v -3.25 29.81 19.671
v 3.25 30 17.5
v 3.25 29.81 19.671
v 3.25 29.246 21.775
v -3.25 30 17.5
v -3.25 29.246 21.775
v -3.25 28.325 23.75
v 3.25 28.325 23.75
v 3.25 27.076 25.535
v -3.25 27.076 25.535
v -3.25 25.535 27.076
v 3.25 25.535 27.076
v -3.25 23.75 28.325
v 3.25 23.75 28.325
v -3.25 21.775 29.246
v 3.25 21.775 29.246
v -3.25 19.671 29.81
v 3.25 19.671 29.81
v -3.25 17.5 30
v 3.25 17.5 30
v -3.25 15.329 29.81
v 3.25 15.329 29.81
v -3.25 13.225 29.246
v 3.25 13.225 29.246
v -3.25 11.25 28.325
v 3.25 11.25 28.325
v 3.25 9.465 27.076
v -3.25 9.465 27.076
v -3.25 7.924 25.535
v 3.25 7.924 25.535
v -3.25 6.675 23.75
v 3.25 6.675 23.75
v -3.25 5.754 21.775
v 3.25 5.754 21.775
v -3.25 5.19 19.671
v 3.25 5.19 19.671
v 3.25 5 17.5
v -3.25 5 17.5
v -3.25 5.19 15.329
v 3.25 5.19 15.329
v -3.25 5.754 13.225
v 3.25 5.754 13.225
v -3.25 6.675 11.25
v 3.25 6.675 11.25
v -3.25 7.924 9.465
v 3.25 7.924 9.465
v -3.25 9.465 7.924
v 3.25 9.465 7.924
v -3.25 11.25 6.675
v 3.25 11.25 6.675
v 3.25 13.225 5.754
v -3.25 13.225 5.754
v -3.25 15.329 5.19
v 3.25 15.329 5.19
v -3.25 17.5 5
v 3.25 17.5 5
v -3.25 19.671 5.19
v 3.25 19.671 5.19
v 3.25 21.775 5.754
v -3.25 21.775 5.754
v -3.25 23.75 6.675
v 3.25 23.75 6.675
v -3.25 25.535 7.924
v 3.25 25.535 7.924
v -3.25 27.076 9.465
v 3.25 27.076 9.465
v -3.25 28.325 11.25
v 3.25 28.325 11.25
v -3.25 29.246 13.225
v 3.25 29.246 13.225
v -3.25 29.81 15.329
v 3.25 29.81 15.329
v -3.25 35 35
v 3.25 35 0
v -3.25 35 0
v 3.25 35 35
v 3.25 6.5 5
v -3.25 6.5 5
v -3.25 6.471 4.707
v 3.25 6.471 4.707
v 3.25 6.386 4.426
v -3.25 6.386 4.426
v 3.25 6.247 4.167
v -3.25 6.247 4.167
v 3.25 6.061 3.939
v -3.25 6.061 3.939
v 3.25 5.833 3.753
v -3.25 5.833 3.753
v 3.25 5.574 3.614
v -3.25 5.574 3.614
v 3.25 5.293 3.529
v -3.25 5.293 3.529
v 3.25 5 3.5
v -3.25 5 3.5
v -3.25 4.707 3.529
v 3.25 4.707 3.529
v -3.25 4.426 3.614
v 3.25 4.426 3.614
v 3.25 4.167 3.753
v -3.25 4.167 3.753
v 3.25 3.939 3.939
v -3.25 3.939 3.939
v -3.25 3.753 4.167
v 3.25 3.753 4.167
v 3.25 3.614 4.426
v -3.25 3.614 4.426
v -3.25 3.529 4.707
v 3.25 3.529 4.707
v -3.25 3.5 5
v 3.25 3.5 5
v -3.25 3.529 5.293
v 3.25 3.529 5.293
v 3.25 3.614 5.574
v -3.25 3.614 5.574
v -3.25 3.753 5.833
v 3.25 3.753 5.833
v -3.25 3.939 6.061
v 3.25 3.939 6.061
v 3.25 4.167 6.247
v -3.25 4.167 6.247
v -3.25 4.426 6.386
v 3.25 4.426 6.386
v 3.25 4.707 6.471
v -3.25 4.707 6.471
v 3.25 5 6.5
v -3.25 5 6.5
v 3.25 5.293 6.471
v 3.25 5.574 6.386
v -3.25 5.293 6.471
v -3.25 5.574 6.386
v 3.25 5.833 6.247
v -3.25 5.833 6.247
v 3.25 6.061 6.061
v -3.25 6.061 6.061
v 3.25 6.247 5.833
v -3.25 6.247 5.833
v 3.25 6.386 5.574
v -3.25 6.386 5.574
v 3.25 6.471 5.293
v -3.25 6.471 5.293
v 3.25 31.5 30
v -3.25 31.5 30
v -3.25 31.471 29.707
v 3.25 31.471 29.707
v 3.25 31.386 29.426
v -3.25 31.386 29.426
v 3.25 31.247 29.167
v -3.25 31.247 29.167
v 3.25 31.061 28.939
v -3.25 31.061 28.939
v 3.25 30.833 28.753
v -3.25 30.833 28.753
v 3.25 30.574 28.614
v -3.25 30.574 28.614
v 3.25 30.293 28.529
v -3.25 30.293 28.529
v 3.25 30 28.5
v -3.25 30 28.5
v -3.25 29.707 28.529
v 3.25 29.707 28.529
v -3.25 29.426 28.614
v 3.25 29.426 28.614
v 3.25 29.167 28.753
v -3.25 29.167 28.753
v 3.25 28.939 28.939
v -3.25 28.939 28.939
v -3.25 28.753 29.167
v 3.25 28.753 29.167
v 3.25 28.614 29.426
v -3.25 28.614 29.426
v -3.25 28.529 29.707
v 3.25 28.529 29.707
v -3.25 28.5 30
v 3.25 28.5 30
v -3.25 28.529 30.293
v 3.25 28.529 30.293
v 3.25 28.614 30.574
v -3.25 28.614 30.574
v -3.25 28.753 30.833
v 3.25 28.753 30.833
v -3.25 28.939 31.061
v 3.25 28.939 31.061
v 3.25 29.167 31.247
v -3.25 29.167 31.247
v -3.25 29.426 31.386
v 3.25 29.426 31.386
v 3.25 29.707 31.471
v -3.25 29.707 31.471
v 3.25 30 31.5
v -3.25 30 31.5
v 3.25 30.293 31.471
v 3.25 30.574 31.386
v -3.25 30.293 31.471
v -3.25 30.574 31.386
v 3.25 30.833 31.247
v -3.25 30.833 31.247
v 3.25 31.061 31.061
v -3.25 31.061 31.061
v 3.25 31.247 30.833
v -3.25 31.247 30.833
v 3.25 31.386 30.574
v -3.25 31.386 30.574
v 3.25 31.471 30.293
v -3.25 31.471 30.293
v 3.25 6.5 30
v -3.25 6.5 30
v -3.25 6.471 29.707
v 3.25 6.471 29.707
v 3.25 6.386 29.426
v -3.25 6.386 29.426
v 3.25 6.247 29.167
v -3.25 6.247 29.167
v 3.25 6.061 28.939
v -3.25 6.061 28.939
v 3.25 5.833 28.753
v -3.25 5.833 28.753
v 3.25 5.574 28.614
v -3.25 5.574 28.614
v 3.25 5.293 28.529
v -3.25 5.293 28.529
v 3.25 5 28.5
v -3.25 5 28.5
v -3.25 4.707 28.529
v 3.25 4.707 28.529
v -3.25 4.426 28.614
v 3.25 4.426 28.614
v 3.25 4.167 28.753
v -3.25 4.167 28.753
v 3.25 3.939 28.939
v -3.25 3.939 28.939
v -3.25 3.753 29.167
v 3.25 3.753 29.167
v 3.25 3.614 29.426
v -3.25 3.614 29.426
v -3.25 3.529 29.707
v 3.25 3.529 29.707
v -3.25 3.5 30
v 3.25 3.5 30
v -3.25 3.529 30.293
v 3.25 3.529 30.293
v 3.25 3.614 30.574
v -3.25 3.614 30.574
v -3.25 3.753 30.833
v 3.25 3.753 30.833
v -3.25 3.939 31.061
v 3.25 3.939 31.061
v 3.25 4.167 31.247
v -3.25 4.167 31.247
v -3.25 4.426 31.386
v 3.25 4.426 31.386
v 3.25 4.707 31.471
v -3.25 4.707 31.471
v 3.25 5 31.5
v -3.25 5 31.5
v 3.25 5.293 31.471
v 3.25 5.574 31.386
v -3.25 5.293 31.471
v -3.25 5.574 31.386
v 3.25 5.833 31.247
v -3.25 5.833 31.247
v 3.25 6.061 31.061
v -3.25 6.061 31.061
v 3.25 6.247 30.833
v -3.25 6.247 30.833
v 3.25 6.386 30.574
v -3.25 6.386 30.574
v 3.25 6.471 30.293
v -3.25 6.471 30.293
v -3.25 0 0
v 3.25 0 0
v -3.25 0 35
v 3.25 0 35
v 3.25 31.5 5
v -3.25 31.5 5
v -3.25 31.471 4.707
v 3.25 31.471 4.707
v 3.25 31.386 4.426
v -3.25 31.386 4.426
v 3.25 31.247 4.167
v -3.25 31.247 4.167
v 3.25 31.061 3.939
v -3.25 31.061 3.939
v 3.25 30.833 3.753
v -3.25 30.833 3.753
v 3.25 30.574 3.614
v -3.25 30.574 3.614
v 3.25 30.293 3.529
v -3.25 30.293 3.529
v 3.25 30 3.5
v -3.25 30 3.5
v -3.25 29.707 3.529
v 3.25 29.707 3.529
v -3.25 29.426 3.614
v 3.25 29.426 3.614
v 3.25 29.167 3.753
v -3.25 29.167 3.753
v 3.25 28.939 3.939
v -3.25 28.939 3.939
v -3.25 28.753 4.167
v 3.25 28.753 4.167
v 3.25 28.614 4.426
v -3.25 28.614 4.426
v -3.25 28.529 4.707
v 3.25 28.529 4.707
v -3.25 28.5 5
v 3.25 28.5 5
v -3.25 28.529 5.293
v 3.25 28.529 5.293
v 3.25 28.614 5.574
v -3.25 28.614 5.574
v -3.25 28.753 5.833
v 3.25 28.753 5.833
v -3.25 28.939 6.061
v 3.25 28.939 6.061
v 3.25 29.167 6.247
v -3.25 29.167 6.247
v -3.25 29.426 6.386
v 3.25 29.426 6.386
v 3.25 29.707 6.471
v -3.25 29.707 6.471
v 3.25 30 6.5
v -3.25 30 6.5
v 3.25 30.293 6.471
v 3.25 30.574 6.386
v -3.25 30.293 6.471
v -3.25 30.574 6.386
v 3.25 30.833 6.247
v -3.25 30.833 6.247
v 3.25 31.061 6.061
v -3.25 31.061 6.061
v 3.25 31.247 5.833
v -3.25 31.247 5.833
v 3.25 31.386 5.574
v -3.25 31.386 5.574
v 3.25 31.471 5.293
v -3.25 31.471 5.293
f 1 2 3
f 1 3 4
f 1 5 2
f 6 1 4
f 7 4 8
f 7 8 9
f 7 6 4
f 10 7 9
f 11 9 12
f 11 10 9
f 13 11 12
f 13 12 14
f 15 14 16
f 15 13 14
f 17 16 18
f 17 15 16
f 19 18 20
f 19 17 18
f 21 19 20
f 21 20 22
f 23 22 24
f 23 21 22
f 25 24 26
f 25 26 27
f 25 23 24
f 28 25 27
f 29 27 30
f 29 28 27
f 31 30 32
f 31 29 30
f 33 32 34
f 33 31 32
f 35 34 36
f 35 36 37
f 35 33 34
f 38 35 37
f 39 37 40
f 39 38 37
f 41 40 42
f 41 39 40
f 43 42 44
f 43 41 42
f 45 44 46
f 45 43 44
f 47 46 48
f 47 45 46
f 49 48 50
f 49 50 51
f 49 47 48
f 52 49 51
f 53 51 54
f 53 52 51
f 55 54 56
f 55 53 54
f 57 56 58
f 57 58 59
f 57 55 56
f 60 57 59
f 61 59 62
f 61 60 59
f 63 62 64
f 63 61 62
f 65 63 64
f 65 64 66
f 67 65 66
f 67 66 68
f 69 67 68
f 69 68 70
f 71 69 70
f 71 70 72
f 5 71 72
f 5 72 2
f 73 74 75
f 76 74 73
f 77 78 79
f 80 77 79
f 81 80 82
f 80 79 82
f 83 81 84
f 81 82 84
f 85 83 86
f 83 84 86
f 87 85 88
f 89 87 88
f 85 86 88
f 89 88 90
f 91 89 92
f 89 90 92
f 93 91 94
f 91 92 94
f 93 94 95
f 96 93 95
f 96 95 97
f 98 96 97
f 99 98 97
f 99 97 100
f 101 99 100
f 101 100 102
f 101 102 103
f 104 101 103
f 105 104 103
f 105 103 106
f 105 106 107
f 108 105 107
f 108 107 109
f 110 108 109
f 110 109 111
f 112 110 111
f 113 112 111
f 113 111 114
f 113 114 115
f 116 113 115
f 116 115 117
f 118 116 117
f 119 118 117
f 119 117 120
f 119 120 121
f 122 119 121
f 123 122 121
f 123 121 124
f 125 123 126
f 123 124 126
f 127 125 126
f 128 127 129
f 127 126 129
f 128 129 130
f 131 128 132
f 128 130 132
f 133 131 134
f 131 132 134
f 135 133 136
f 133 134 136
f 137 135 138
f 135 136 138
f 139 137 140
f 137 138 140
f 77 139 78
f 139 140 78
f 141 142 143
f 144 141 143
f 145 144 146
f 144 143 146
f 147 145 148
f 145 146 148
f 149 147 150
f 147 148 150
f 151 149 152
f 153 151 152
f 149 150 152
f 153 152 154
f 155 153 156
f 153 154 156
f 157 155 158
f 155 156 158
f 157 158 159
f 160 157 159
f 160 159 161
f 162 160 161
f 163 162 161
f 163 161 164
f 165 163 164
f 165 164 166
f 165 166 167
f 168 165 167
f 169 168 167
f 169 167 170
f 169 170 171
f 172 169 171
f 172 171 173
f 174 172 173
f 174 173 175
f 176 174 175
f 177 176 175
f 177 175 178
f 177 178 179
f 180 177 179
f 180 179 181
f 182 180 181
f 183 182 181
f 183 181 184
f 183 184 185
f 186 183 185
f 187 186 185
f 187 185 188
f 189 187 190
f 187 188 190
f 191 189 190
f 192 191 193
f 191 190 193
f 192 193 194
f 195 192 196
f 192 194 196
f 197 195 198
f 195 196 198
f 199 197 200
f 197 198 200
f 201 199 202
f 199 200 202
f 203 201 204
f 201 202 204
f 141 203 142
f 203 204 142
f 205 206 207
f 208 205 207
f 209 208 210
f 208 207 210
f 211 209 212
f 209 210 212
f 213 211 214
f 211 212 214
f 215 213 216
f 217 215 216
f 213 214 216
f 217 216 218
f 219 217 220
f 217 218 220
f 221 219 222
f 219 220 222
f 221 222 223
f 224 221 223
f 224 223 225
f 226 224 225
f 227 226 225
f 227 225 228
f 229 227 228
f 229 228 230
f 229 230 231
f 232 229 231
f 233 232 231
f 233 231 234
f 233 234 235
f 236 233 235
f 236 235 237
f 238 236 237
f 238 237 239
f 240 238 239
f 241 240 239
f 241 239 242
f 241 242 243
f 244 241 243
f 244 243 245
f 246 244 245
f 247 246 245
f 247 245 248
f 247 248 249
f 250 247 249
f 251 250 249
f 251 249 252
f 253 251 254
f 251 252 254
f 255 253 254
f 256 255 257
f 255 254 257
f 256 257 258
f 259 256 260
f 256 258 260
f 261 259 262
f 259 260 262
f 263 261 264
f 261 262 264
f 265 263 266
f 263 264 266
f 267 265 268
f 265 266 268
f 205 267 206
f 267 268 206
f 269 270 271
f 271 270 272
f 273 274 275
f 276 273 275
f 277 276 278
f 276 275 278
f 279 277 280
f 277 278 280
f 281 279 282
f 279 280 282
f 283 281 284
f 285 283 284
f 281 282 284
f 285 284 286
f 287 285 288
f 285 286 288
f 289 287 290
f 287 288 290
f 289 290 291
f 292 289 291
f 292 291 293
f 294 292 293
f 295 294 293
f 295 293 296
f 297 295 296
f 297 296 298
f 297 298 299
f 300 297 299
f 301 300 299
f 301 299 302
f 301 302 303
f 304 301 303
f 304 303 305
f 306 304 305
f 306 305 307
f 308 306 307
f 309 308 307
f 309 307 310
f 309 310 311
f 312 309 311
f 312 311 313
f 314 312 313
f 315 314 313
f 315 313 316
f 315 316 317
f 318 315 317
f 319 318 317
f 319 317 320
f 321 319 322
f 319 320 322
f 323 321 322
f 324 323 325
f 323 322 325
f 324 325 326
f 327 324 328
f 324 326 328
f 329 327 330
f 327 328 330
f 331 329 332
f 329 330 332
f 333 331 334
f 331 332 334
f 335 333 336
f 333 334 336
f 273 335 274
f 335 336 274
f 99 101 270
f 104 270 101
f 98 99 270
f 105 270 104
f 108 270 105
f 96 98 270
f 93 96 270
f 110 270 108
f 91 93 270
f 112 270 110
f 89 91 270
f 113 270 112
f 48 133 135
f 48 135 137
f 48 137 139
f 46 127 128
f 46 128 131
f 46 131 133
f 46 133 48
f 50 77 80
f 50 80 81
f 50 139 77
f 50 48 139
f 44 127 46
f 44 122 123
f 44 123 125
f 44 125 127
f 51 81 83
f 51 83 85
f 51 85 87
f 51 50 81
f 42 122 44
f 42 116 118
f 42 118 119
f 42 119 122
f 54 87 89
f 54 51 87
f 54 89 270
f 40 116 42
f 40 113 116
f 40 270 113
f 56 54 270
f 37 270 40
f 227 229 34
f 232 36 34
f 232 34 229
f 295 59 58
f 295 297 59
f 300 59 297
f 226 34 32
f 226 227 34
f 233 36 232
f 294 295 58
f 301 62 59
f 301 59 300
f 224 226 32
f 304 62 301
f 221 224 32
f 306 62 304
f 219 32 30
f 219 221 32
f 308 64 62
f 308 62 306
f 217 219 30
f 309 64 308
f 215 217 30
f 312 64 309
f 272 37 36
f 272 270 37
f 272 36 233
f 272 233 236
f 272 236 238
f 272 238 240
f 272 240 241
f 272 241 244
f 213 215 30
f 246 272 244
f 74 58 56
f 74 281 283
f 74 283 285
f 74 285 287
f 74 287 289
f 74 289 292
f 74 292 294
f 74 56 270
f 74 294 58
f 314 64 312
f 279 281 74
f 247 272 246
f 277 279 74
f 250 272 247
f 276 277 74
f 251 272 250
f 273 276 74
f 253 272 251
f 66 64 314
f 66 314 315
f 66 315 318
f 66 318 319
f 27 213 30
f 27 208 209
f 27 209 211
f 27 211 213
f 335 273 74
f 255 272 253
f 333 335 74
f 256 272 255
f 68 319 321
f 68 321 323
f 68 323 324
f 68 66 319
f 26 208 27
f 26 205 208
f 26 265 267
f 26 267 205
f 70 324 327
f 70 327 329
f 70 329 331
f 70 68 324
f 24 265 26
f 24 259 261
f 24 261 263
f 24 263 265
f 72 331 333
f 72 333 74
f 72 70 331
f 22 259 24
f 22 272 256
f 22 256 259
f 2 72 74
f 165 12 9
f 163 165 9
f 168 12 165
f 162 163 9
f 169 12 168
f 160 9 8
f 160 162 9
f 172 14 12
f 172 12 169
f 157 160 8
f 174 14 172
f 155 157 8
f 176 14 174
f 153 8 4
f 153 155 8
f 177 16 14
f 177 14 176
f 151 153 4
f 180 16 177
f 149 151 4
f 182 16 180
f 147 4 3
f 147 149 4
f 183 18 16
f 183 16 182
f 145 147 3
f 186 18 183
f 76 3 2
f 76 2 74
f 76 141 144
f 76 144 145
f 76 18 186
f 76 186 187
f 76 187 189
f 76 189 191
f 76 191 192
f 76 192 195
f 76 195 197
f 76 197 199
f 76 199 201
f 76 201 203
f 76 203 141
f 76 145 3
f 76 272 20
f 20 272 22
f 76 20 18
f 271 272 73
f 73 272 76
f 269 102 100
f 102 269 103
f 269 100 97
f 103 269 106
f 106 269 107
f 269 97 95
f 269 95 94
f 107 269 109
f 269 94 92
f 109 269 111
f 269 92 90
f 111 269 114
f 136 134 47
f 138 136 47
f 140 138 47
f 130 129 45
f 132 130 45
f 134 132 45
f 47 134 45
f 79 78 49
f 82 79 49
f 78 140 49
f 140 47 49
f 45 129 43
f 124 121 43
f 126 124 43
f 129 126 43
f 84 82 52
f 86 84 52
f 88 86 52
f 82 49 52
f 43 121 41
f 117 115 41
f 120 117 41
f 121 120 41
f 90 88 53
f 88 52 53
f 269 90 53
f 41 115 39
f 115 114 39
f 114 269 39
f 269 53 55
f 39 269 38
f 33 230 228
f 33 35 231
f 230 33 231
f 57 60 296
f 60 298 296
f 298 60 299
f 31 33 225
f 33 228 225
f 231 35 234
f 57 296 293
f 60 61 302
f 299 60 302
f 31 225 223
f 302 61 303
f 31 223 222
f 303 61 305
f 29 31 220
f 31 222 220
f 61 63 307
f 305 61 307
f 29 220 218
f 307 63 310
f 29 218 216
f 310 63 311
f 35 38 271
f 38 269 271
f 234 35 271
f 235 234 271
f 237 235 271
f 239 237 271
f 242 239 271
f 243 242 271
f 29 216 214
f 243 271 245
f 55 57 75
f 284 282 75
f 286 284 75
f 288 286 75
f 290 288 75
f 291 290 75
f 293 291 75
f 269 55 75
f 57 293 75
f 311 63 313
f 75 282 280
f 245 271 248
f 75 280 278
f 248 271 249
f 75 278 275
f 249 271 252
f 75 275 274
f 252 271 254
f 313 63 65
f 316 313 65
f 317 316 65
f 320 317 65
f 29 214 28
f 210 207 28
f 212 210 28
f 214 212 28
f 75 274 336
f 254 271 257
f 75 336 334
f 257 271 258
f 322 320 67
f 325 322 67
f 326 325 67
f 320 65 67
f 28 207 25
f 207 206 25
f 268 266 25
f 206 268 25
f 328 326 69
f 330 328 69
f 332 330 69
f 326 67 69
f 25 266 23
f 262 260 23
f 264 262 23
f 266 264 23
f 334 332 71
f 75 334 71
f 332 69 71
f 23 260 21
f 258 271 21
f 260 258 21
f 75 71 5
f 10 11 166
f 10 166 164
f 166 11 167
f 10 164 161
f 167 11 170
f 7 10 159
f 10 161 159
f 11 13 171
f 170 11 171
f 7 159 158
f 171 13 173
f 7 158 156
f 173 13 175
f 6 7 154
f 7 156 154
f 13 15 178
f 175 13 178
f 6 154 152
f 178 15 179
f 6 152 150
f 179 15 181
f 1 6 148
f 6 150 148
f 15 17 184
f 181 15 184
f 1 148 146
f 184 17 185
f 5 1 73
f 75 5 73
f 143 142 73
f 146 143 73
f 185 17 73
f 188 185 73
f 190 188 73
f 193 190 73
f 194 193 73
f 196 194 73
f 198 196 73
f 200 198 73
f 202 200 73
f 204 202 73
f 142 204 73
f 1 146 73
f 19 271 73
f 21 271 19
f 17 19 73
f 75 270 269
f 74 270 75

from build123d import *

# Parameters (mm, degrees)
SKETCH_W    = 35
SKETCH_H    = 35
SKETCH_R    = 12.5
PAD_DEPTH   = 3.25
SKETCH001_R = 1.5
HOLE_DEPTH  = 25


with BuildPart() as part:
    # Sketch → Pad (new body, symmetric)
    with BuildSketch(Plane.YZ):
        with Locations((17.5, 17.5)):
            Rectangle(SKETCH_W, SKETCH_H)
        with Locations((17.5, 17.5)):
            Circle(SKETCH_R, mode=Mode.SUBTRACT)
    extrude(amount=PAD_DEPTH, both=True)

    # Sketch001 (on Face6 of Pad) → Hole (cut)
    with BuildSketch(Plane(origin=(-3.25, 0, 0), x_dir=(0, 1, 0), z_dir=(-1, 0, 0))):
        with Locations((30, -30)):
            Circle(SKETCH001_R)
        with Locations((5, -5)):
            Circle(SKETCH001_R)
        with Locations((30, -5)):
            Circle(SKETCH001_R)
        with Locations((5, -30)):
            Circle(SKETCH001_R)
    extrude(amount=-HOLE_DEPTH, mode=Mode.SUBTRACT)


solid = part.part
